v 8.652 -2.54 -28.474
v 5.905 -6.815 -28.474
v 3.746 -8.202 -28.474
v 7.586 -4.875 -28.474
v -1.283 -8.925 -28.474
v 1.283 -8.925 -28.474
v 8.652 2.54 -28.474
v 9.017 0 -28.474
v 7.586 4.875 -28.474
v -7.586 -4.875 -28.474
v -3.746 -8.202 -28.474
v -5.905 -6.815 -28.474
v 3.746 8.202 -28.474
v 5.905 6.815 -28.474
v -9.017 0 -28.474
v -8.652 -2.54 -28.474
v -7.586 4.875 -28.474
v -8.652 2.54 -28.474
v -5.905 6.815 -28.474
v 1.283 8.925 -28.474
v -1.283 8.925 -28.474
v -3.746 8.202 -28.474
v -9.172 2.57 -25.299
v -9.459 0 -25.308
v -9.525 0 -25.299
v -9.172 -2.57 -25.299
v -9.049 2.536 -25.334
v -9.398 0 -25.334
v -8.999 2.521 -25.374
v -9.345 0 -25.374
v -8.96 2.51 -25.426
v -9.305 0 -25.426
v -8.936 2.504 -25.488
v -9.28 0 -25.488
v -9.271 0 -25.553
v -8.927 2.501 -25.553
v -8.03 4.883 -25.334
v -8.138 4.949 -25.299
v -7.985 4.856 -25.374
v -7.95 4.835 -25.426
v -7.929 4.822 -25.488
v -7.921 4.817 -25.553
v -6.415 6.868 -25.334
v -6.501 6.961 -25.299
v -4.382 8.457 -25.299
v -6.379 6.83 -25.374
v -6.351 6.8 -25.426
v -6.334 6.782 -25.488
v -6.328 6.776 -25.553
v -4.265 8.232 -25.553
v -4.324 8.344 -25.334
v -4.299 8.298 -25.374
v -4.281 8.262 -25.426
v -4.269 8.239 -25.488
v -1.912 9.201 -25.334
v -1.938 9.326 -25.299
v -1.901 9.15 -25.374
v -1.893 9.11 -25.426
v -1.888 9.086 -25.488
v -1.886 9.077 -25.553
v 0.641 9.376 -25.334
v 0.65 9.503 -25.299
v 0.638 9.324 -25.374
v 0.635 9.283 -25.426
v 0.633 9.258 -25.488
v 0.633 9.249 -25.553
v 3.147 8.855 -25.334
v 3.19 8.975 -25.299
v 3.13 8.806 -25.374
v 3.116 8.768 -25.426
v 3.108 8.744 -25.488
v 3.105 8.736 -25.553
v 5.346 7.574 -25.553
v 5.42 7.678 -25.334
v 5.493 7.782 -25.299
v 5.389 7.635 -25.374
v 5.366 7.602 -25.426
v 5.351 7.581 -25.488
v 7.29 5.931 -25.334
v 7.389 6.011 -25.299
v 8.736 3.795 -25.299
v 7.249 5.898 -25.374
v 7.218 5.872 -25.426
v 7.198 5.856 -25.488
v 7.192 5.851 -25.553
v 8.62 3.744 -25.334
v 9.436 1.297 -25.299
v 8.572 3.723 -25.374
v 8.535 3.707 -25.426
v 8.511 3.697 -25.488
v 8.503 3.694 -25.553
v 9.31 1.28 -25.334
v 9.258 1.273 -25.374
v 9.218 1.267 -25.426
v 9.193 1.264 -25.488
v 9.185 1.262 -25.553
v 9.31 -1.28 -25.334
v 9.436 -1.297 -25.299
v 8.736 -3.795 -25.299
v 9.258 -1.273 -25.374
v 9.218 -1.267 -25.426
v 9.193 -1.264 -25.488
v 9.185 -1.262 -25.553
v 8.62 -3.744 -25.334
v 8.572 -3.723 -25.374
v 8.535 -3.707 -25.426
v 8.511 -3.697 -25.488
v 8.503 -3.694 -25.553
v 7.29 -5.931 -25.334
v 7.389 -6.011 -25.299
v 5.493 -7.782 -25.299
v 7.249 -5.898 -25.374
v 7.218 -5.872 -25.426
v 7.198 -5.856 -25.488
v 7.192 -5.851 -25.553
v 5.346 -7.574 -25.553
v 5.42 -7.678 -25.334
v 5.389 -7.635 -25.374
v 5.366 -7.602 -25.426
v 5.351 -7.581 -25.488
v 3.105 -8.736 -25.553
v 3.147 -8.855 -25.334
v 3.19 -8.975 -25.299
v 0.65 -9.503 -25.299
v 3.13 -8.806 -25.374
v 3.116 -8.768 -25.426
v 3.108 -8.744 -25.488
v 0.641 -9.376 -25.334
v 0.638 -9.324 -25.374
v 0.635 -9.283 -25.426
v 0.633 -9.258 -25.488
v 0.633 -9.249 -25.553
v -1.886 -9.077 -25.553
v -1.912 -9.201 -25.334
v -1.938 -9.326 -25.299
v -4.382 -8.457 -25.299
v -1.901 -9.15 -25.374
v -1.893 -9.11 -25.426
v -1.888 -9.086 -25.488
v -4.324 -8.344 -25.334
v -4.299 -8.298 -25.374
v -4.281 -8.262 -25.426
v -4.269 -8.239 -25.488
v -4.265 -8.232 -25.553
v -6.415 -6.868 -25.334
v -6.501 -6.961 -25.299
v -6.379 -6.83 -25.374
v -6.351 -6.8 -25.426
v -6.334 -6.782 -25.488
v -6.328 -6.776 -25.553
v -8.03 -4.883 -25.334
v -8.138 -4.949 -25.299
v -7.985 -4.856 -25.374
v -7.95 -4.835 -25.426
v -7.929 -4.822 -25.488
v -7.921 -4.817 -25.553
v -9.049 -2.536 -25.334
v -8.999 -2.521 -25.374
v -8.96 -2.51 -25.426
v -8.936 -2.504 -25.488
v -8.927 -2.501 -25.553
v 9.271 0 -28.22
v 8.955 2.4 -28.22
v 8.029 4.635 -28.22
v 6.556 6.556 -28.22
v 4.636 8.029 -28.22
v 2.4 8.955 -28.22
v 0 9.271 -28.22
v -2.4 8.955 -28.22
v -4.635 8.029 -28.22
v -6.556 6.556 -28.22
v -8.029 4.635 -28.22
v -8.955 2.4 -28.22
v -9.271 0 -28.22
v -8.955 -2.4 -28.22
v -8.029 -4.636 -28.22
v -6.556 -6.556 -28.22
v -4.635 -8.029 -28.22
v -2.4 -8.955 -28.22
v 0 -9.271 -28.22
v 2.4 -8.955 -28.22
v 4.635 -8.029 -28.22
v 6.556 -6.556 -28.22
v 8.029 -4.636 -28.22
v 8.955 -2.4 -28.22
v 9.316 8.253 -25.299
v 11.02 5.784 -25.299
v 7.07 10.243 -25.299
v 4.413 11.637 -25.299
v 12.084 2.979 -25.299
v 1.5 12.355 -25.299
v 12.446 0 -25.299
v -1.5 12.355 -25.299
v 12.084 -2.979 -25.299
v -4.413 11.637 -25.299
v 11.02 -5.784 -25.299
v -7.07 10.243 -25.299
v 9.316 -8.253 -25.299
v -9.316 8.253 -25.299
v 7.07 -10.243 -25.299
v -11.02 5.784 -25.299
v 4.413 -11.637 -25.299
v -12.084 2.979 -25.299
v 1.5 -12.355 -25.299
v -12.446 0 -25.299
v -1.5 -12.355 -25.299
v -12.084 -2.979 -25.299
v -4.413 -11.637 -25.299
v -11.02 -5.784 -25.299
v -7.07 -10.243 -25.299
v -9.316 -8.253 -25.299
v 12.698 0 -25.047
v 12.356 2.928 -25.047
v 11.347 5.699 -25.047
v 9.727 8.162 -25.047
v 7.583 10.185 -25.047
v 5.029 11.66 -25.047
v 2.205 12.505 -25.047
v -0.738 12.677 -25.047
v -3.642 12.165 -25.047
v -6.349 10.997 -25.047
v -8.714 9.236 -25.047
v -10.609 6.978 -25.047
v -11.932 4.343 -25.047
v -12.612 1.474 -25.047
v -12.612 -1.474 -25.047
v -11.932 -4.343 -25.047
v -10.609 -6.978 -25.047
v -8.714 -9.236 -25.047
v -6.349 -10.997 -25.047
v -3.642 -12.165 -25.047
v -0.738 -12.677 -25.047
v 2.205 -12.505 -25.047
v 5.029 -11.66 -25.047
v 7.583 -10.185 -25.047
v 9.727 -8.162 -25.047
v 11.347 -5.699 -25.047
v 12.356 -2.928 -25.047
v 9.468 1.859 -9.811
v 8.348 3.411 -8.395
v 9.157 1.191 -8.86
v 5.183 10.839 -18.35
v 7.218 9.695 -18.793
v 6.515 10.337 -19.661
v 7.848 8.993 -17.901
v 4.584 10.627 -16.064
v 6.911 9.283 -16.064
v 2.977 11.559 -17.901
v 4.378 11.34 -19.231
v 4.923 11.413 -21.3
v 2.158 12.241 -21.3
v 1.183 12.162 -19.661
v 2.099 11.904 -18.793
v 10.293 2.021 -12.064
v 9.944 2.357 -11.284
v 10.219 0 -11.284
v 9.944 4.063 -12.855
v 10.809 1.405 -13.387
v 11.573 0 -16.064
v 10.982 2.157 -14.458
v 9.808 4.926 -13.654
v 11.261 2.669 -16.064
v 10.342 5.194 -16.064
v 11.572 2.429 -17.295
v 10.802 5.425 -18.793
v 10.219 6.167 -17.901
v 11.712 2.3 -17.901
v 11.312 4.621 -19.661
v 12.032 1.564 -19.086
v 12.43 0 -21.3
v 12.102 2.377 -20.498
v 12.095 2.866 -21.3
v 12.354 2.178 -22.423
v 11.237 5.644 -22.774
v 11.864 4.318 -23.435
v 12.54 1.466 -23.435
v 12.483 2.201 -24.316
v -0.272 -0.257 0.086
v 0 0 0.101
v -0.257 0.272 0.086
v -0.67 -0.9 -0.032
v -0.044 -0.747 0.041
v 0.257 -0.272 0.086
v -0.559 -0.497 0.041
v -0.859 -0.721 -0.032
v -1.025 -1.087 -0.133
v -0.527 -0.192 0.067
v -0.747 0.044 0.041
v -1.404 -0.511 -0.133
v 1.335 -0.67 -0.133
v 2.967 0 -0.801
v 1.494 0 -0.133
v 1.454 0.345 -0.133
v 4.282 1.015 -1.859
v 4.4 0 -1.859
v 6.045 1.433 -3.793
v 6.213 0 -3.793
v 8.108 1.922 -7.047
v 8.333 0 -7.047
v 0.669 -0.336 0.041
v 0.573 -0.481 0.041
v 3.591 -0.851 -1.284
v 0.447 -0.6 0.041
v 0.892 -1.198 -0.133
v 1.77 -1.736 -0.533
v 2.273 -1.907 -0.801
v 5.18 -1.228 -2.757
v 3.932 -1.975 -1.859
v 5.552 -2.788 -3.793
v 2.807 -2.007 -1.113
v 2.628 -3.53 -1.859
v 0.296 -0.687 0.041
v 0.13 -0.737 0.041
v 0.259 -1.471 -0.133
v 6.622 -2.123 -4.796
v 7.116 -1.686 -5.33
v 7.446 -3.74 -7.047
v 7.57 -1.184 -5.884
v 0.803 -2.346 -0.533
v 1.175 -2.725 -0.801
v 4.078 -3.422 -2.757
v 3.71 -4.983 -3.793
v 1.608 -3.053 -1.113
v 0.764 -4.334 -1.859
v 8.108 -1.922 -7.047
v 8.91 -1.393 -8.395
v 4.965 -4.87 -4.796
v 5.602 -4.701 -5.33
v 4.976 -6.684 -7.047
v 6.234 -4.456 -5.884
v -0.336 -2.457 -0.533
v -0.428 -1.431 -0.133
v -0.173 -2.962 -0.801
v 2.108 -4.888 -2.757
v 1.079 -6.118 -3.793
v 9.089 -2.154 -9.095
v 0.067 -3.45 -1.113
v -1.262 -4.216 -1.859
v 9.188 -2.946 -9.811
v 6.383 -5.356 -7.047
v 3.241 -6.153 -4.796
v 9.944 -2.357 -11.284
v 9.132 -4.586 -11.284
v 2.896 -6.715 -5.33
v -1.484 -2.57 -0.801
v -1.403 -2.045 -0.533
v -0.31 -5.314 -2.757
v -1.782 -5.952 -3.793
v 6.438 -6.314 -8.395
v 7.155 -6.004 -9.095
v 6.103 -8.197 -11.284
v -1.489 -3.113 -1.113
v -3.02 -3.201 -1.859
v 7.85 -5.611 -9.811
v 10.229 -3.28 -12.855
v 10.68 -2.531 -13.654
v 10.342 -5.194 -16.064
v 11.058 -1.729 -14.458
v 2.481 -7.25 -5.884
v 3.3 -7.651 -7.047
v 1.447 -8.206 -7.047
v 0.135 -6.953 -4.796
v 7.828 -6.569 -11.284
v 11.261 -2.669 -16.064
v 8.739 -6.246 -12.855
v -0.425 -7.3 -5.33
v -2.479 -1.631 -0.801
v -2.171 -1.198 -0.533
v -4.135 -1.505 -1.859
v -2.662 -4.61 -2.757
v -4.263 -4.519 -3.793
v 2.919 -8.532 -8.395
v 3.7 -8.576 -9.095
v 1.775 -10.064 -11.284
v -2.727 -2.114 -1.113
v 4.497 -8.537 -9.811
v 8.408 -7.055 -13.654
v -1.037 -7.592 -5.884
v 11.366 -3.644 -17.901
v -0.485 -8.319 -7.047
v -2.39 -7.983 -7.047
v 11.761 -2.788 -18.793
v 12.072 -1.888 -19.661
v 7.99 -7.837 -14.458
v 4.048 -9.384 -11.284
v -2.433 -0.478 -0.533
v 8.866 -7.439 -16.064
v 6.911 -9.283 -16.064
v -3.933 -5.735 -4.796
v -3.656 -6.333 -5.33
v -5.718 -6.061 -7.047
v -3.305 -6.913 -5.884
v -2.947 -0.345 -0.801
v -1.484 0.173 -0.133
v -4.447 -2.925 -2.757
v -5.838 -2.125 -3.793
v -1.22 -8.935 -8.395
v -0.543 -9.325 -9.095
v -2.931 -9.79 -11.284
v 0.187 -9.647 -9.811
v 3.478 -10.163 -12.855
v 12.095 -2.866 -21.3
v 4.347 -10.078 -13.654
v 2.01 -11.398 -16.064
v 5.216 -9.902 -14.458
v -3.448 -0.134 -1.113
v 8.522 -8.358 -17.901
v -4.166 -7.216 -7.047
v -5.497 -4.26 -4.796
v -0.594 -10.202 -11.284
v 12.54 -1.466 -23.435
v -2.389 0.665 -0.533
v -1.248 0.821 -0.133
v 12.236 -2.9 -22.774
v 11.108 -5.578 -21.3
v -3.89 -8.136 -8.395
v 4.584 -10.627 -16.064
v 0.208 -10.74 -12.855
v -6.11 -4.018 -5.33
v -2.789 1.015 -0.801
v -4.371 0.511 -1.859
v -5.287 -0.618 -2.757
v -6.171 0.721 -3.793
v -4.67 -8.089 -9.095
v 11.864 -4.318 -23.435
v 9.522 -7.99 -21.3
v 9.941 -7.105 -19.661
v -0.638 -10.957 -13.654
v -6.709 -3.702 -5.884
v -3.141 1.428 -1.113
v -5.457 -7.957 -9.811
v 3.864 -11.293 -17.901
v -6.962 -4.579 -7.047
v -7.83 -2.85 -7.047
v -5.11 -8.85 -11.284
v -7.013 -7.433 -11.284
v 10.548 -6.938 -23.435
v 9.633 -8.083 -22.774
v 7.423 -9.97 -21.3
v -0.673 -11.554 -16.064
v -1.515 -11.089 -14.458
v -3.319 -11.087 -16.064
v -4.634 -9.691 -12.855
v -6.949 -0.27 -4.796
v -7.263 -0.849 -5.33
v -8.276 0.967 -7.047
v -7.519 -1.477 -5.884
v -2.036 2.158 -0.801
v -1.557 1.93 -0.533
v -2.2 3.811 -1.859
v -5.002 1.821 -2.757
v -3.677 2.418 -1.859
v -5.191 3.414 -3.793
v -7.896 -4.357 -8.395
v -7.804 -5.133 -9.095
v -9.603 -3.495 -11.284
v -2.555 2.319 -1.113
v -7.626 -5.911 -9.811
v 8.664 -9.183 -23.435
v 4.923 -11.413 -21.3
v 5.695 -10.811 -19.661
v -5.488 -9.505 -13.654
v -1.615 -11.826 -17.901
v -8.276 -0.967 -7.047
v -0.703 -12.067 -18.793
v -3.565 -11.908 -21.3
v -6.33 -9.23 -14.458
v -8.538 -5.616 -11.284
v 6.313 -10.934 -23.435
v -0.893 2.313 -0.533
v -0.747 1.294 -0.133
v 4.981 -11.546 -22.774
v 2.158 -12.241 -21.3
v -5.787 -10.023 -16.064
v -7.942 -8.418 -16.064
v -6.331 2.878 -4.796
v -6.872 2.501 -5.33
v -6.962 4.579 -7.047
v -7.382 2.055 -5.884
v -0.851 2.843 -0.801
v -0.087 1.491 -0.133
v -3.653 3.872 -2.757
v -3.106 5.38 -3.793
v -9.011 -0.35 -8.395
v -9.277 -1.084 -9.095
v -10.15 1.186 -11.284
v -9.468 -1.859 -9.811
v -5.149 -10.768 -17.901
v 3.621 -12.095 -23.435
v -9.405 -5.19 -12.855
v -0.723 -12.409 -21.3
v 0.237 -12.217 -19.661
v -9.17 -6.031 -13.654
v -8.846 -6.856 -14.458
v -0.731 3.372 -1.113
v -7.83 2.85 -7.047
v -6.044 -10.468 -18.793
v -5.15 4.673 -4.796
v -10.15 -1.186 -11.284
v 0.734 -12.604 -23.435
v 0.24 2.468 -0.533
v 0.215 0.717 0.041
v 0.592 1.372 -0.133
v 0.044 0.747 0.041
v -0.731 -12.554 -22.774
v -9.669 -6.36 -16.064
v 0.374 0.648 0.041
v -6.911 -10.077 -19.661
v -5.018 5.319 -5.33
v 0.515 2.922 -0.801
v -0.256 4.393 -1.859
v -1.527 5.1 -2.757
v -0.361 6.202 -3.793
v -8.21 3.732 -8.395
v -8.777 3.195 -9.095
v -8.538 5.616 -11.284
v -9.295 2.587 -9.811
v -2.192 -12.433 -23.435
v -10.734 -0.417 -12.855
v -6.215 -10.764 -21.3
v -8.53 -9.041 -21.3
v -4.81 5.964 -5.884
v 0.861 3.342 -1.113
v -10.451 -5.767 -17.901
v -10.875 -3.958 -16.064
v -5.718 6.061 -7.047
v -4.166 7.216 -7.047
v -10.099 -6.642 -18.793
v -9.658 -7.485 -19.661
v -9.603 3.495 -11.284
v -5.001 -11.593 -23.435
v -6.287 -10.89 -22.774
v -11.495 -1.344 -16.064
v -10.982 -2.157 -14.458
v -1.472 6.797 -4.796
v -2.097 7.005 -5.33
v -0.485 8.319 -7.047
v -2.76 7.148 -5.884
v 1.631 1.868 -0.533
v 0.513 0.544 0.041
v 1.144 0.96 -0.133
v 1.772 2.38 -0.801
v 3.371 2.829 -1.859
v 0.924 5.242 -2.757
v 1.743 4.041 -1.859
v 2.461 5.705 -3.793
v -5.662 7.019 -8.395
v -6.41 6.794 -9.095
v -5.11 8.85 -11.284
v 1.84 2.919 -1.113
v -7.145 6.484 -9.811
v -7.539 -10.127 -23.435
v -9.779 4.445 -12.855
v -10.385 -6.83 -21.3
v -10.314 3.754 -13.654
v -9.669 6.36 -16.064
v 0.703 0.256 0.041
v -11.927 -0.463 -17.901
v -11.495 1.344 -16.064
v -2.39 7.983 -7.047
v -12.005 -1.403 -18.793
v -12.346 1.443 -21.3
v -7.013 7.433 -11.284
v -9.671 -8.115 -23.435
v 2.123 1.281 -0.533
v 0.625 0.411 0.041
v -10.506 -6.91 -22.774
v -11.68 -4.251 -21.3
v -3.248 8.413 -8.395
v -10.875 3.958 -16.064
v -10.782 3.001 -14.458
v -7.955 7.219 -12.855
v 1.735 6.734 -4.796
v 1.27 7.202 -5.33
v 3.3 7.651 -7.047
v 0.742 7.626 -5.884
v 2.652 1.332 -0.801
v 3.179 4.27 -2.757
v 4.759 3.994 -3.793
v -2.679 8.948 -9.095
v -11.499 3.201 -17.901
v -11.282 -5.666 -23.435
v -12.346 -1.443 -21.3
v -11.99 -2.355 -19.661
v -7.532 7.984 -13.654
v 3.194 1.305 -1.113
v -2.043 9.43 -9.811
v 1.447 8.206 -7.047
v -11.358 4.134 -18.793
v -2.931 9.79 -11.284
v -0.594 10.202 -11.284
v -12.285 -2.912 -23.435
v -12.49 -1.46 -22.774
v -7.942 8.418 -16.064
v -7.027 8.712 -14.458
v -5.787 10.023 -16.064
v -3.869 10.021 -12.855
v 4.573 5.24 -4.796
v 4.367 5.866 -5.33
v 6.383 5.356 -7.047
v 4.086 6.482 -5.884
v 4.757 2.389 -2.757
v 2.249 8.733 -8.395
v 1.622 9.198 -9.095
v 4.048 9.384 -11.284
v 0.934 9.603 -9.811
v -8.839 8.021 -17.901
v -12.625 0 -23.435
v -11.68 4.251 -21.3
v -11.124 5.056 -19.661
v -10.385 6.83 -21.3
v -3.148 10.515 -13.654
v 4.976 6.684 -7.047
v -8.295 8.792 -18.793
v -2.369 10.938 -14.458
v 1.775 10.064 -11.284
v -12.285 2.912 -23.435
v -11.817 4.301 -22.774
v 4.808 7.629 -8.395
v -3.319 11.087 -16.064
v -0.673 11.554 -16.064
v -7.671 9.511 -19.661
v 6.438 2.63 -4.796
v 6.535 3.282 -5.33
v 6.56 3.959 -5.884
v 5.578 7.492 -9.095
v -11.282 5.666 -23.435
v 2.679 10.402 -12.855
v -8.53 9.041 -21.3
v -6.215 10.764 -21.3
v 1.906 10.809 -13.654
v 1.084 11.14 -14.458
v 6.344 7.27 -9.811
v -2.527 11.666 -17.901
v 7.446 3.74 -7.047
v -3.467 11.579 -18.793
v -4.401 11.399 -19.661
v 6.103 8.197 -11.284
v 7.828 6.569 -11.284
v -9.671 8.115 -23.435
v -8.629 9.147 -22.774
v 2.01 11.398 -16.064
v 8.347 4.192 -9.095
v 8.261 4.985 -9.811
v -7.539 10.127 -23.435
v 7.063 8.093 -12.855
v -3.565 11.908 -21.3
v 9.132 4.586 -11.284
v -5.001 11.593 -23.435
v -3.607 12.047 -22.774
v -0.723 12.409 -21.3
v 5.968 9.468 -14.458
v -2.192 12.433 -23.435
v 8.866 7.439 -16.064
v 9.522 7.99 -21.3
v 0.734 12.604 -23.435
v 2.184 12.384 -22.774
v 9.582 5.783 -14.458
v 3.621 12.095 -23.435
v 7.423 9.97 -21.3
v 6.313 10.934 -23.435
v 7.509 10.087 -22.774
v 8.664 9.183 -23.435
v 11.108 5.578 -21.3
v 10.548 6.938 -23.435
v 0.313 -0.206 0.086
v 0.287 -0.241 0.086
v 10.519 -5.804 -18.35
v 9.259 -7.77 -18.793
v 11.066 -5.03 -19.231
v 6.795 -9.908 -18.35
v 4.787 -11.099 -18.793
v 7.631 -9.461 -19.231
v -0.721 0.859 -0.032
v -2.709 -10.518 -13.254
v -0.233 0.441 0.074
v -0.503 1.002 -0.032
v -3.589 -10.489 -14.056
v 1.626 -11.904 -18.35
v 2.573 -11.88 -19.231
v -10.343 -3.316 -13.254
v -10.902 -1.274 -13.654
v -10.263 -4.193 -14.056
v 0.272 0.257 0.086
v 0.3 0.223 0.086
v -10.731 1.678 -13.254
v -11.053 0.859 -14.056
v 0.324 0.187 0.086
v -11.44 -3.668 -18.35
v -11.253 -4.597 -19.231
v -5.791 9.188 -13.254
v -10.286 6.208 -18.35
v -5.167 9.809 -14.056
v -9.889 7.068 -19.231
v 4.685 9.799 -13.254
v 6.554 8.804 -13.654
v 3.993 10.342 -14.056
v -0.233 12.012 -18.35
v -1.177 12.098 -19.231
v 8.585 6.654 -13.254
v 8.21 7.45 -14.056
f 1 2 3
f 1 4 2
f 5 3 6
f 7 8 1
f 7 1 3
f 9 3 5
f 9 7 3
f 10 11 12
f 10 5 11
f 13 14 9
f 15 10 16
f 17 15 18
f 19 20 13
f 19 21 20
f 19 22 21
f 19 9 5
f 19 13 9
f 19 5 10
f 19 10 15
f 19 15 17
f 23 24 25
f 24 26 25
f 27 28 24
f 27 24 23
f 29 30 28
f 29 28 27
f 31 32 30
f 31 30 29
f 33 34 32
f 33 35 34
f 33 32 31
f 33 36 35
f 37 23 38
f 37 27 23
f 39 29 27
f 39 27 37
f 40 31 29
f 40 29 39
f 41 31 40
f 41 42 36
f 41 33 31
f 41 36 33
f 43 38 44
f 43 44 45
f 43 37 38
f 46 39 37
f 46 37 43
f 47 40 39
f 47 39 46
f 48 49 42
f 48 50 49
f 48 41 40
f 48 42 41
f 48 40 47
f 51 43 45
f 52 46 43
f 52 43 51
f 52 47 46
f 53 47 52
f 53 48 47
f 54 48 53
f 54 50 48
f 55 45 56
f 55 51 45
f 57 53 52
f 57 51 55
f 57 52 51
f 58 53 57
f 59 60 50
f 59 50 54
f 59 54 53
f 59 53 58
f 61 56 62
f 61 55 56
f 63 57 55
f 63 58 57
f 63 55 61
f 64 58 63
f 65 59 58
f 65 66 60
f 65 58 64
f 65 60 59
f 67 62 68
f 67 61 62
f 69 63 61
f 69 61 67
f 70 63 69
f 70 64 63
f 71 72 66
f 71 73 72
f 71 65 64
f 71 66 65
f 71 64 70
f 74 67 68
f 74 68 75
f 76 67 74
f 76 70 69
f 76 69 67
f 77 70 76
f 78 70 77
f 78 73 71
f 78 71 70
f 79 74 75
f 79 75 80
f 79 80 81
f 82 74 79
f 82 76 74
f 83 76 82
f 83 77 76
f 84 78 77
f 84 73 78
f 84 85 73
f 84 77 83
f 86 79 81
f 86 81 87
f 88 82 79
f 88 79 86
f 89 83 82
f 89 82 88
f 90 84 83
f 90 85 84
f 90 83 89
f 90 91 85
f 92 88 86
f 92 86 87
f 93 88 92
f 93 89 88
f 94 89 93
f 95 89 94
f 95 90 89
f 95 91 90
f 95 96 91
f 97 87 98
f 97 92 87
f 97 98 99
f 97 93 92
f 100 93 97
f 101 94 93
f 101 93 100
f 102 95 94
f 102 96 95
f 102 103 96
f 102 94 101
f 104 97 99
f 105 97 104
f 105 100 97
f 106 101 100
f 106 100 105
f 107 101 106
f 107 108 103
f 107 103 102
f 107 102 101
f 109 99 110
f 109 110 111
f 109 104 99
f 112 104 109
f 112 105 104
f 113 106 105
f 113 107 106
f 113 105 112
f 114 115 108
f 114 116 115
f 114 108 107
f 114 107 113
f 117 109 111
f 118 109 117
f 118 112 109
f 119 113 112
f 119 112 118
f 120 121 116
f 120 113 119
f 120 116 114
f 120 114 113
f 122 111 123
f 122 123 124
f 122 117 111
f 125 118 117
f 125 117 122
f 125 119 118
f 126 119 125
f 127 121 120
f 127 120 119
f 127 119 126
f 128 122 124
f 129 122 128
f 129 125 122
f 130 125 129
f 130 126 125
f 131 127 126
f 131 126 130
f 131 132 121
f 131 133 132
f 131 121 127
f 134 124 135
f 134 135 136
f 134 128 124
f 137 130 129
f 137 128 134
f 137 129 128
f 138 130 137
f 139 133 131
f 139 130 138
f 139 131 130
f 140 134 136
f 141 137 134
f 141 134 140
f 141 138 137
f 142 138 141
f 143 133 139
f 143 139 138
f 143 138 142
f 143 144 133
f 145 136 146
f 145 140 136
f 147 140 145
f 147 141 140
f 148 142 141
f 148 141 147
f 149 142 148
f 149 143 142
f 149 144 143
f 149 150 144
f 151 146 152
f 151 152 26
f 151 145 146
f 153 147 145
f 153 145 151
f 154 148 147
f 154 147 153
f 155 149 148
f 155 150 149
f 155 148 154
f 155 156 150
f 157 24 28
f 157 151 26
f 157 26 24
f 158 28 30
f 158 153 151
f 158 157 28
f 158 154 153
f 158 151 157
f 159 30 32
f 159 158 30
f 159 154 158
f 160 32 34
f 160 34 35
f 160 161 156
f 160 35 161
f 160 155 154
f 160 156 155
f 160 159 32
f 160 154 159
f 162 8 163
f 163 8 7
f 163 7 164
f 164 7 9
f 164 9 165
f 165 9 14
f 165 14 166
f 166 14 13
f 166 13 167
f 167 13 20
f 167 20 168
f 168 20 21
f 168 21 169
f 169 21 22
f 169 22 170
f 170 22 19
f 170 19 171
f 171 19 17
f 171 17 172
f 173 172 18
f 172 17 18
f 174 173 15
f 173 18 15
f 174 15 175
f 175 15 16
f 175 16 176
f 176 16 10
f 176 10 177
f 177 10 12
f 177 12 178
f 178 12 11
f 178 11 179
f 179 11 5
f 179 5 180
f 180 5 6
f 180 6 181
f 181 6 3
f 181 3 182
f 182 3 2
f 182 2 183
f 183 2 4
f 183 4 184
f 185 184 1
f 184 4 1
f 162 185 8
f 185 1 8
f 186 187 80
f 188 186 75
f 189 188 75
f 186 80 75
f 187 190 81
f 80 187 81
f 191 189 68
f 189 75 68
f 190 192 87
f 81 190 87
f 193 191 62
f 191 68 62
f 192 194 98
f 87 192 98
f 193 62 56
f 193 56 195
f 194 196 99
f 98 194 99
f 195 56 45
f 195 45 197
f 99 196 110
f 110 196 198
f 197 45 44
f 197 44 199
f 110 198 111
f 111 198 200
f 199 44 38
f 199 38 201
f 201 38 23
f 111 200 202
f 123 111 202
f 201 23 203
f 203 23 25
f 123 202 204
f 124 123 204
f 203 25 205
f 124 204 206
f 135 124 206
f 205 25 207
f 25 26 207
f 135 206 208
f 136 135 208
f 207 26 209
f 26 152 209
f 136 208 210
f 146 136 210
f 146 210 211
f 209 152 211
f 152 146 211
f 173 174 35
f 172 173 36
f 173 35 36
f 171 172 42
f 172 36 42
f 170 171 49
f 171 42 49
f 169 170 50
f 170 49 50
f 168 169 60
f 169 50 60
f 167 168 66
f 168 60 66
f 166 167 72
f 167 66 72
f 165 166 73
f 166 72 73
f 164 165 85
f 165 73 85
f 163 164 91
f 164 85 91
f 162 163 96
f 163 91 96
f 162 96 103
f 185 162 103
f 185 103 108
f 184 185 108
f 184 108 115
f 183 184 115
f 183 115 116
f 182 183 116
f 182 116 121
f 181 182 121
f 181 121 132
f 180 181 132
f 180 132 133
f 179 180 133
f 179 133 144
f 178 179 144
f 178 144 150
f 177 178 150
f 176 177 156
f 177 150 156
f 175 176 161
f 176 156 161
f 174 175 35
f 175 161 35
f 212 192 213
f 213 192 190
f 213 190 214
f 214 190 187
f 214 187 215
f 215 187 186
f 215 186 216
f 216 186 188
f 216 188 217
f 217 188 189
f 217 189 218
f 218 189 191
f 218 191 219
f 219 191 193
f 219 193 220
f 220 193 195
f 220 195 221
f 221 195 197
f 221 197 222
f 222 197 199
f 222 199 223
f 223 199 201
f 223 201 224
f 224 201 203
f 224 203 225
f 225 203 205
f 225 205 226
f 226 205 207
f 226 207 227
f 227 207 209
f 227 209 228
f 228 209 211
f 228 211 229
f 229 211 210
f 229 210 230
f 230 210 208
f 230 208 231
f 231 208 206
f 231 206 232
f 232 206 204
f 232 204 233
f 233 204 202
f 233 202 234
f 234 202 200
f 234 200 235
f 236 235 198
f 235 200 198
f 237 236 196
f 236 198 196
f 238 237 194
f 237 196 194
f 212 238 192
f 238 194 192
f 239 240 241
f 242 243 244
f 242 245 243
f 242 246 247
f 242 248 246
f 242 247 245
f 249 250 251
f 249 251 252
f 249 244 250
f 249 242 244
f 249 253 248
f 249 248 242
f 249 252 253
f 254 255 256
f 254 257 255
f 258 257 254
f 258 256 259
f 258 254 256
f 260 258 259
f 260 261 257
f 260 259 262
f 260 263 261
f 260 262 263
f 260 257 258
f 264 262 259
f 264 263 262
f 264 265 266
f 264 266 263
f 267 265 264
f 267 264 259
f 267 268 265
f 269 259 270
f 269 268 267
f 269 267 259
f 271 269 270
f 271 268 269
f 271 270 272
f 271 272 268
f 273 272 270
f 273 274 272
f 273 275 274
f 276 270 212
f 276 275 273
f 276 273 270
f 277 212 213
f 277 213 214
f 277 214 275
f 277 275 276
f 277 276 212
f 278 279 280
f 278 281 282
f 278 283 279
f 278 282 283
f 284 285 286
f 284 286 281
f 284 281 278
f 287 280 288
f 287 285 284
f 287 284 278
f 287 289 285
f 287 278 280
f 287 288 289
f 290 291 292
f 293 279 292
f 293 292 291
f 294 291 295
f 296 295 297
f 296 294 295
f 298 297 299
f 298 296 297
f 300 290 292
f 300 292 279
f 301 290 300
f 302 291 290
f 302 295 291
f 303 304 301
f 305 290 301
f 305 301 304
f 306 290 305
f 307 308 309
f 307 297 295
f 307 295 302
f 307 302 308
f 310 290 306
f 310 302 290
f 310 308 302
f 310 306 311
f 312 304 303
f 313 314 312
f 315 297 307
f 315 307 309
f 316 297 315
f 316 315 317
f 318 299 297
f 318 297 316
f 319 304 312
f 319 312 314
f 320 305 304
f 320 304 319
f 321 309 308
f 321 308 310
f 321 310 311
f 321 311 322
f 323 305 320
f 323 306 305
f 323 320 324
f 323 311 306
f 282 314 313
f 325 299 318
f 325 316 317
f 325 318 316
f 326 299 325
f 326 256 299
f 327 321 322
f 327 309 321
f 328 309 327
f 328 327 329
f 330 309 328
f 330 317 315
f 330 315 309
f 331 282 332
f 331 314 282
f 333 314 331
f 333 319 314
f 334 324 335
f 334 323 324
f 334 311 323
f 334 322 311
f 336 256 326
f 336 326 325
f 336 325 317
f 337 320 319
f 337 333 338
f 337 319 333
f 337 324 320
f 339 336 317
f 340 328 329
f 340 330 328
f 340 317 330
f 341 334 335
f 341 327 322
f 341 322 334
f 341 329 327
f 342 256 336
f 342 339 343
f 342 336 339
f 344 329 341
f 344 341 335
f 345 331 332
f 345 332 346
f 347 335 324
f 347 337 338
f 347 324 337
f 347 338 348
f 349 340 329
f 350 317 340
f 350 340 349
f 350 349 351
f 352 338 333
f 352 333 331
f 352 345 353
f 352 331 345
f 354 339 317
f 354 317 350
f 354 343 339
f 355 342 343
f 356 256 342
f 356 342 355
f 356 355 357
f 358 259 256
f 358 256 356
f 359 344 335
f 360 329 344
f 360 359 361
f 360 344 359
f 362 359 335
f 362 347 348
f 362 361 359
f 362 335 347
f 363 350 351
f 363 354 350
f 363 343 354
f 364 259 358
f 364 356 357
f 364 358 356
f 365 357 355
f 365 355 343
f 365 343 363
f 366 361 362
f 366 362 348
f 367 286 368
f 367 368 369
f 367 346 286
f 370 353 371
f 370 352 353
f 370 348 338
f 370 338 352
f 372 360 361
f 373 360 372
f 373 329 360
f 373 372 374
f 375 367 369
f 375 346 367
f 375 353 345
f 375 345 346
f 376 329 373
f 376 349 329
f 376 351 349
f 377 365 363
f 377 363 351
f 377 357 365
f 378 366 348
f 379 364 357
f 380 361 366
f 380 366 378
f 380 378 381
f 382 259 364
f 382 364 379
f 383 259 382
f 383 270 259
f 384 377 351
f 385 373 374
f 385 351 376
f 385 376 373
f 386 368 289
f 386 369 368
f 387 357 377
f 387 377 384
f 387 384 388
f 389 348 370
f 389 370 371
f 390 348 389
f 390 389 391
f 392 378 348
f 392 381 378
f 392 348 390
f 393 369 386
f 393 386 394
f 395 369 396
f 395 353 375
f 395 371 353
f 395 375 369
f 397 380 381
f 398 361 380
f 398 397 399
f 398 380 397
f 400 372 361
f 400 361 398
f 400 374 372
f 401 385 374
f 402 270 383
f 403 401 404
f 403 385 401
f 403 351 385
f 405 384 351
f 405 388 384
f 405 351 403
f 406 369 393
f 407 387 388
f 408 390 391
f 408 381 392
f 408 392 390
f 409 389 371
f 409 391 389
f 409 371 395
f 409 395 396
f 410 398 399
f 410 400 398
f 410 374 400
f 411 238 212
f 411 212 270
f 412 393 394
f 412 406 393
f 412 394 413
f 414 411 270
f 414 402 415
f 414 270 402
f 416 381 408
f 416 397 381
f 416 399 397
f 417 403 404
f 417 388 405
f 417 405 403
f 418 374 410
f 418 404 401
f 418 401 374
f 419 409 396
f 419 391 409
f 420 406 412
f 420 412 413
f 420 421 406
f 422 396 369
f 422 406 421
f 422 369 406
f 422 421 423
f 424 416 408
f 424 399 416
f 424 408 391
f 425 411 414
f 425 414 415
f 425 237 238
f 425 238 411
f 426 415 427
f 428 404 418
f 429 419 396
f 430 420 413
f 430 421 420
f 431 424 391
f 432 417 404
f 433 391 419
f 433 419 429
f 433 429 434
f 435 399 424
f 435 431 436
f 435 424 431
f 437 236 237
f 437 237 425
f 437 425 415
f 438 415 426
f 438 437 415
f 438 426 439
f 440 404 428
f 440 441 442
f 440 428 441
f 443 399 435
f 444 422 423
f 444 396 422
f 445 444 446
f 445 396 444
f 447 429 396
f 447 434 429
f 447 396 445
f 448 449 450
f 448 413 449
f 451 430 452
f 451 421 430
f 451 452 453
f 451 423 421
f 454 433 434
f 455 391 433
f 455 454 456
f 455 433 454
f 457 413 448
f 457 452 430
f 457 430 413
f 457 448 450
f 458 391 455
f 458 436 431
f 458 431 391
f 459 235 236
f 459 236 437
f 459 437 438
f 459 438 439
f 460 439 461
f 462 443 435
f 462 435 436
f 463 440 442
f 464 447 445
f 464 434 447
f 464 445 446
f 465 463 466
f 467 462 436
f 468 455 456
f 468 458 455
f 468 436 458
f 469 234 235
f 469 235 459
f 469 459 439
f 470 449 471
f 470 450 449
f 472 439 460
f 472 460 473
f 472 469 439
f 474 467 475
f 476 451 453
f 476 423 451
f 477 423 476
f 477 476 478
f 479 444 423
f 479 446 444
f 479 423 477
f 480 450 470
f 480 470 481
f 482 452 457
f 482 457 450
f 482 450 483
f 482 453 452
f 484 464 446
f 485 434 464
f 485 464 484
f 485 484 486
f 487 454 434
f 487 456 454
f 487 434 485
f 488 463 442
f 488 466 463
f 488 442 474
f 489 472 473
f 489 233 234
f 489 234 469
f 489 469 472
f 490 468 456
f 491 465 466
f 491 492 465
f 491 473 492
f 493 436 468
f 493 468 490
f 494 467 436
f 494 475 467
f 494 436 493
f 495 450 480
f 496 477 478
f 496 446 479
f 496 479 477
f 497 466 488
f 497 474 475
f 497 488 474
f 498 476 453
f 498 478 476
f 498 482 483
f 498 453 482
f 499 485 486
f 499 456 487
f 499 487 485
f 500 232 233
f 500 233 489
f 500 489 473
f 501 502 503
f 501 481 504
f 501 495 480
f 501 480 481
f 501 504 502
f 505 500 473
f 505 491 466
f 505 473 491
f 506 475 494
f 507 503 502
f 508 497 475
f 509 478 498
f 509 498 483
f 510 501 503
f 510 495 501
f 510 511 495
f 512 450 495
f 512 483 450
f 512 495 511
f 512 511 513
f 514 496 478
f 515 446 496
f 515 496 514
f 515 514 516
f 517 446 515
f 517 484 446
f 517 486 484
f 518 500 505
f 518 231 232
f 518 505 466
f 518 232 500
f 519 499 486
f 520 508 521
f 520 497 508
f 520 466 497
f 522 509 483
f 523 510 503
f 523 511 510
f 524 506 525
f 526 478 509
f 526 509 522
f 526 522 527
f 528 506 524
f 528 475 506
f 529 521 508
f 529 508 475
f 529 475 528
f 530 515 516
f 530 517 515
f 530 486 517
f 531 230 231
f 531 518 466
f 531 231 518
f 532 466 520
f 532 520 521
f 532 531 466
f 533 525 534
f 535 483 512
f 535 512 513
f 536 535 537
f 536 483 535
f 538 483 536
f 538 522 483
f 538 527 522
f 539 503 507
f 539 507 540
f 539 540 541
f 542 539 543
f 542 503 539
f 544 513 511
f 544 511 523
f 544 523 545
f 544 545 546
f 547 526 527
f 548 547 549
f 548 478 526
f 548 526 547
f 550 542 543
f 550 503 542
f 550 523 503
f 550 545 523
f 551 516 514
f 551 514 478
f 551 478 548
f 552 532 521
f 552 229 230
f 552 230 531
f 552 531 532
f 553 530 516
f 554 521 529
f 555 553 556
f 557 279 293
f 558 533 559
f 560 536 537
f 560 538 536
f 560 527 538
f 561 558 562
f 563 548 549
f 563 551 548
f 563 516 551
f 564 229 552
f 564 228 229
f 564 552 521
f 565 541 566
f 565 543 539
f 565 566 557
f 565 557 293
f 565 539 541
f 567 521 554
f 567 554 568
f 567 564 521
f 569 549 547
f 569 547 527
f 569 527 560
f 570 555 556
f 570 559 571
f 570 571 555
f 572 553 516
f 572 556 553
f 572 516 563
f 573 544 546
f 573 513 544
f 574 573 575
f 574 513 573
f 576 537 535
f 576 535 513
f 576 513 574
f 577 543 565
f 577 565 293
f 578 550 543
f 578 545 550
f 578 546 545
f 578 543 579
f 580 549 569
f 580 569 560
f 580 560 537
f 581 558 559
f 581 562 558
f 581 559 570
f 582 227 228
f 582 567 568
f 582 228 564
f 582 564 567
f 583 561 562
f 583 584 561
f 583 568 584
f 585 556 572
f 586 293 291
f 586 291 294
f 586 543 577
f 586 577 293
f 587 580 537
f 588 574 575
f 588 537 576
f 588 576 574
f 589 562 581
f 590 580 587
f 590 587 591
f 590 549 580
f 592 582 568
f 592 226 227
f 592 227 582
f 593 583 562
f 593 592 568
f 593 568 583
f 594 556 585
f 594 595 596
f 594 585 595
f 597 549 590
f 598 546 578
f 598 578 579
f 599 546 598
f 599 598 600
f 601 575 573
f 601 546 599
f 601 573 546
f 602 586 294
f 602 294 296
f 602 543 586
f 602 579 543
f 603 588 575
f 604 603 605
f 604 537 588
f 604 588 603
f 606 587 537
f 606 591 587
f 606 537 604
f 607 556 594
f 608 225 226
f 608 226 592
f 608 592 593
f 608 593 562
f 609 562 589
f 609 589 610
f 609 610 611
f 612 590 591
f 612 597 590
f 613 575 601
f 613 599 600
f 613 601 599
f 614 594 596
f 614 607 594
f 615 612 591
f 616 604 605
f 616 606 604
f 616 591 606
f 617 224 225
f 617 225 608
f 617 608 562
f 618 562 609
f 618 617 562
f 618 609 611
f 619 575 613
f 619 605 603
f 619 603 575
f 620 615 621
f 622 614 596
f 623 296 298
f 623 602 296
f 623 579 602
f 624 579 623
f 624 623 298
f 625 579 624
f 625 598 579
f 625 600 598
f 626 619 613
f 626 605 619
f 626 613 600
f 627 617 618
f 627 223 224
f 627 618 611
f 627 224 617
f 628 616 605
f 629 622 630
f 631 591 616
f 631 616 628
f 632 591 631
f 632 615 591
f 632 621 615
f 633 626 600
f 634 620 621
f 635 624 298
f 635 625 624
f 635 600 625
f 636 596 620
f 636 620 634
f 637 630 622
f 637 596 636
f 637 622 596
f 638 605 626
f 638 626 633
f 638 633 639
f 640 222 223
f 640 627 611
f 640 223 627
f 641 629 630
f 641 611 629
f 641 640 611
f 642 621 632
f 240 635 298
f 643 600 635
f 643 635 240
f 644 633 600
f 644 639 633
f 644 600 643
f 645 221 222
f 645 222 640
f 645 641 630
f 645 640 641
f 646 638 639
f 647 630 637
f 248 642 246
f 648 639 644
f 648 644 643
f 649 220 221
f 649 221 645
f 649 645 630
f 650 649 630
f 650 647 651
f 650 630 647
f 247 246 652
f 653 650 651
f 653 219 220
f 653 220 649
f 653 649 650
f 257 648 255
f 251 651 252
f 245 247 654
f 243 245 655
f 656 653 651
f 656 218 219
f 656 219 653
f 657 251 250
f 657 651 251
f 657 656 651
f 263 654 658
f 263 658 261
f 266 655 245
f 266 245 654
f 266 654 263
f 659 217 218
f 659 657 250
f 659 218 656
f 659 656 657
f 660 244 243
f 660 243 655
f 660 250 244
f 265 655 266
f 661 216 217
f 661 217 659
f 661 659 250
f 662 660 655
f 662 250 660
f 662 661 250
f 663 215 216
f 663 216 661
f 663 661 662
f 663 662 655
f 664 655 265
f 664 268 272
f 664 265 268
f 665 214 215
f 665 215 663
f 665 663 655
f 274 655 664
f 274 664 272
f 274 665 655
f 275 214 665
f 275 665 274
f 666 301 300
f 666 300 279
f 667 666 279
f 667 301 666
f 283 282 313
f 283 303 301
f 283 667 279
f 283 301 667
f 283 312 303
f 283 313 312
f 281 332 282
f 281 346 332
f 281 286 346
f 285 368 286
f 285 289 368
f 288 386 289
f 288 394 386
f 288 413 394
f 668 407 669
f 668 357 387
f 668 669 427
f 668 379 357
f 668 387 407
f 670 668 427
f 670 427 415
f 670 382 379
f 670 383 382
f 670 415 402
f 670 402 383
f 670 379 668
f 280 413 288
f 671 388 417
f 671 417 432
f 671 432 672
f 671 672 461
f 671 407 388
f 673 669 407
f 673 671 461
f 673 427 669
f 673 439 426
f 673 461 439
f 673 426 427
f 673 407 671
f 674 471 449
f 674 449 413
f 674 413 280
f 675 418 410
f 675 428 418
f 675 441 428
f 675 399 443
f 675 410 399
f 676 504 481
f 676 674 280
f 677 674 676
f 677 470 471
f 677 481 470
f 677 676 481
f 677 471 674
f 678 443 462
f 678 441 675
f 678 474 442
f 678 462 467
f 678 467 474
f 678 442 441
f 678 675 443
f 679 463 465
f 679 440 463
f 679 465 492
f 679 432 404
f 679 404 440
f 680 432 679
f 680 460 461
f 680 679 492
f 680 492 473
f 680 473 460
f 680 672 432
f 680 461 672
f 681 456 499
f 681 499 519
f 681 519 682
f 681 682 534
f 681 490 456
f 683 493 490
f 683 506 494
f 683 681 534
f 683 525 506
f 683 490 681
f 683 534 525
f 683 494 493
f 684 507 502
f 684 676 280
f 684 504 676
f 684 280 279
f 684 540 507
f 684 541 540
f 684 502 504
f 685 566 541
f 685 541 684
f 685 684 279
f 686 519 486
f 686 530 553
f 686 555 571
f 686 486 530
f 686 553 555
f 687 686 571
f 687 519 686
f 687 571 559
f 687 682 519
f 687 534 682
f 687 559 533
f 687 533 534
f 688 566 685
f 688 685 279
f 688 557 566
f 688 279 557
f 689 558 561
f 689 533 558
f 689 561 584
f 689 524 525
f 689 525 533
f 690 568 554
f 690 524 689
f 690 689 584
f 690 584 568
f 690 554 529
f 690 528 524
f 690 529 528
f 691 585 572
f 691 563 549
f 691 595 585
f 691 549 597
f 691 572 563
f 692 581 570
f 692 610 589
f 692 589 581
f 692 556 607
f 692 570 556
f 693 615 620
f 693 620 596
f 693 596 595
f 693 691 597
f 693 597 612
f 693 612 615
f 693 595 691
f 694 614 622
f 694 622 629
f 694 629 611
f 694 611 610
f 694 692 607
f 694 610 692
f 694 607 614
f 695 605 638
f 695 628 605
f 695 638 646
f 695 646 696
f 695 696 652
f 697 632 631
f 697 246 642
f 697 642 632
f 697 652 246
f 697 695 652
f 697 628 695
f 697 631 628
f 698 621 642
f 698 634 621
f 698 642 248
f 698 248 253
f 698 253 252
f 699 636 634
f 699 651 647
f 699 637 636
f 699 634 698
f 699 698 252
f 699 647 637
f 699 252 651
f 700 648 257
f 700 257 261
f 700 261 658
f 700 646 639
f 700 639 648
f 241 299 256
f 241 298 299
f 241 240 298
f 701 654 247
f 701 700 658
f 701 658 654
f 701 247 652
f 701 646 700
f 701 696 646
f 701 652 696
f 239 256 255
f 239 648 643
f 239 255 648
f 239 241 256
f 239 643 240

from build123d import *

# Parameters (mm, degrees)
SKETCH3_R           = 9.271
BOSS_EXTRUDE1_DEPTH = 3.175
FILLET1_R           = 0.254


with BuildPart() as part:
    # Sketch2 → Revolve5 (revolve)
    with BuildSketch(Plane(origin=(0, 0, 0.100515376), x_dir=(1, 0, 0), z_dir=(0, 1, 0))):
        with BuildLine():
            Line((0, 0), (0, 25.4))
            Line((0, 25.4), (12.7, 25.4))
            add(Edge.make_bspline(
                [(0, 0), (4.251787512, -0.000213004), (11.607750415, 10.081742809), (12.7, 23.292671224), (12.7, 25.4)],
                knots=[0.5, 0.5, 0.5, 0.5, 0.789002784, 1, 1, 1, 1], degree=3))
        make_face()
    revolve(axis=Axis((0, 0, 0.100515376), (0, 0, -1)))

    # Sketch3 → Boss-Extrude1 (add)
    with BuildSketch(Plane(origin=(0, 0, -25.299484624), x_dir=(-1, 0, 0), z_dir=(0, 0, -1))):
        Circle(SKETCH3_R)
    extrude(amount=BOSS_EXTRUDE1_DEPTH)

    # Fillet1
    fillet1_edges = [part.edges().sort_by_distance(p)[0] for p in [
        (9.271, 0, -25.299484624),
    ]]
    fillet(fillet1_edges, radius=FILLET1_R)

    # Chamfer1: read off the stored shape, not the designer's step
    # Chamfer1 outline → Chamfer1 (revolve, cut)
    with BuildSketch(Plane.XZ):
        Polygon((9.271, -28.220484624), (9.017, -28.474484624), (9.271, -28.474484624), align=None)
        Polygon((12.698013115, -25.047471509), (12.446, -25.299484624), (12.698013115, -25.299484624), align=None)
    revolve(axis=Axis((0, 0, 0), (0, 0, 1)), mode=Mode.SUBTRACT)

    # Chamfer1 2 outline → Chamfer1 2 (revolve, cut)
    with BuildSketch(Plane.XZ):
        with BuildLine():
            add(Edge.make_bspline(
                [(12.698013115, -25.047471509), (12.699349278, -25.136229047), (12.7, -25.220304585), (12.7, -25.299484624)],
                knots=[0.992072064, 0.992072064, 0.992072064, 0.992072064, 1, 1, 1, 1], degree=3))
            Line((12.698013115, -25.047471509), (12.698013115, -25.299484624))
            Line((12.698013115, -25.299484624), (12.7, -25.299484624))
        make_face()
    revolve(axis=Axis((0, 0, 0), (0, 0, 1)), mode=Mode.SUBTRACT)


solid = part.part
